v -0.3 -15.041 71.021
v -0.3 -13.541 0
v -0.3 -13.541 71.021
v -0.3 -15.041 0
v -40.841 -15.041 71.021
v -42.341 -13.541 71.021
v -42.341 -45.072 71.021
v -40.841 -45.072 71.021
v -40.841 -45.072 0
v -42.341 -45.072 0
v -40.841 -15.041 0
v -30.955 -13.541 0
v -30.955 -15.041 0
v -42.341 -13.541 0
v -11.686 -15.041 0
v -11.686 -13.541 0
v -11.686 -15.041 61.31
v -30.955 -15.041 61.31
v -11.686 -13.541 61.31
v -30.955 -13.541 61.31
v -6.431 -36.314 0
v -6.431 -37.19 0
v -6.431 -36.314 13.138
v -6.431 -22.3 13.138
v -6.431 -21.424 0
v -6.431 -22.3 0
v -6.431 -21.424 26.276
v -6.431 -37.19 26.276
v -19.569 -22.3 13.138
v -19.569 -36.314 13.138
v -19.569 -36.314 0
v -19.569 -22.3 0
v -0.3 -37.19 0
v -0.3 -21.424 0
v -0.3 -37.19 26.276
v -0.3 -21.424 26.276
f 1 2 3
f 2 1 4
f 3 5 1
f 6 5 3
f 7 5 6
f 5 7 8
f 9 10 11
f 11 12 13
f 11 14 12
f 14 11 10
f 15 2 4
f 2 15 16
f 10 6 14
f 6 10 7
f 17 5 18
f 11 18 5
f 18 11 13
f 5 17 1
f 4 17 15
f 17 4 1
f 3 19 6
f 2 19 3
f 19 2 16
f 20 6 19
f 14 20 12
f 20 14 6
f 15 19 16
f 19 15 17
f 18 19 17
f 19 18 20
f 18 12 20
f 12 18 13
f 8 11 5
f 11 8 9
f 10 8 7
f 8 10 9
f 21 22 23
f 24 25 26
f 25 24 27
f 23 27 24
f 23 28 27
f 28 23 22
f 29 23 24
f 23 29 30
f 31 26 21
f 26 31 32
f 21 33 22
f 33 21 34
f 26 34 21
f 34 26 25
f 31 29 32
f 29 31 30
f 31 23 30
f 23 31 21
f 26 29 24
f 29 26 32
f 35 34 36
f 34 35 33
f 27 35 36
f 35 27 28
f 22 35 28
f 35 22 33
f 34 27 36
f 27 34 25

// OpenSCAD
// =====================================================================
//  VIEW 15: RESTROOM  -  print 1
//  Milwaukee Road 1939 rib side bay window caboose - G scale (1:29)
//  Restroom partitions and toilet
//  Print orientation: upright
//
//  Open this file in OpenSCAD to look at just this part.
//  To export this part's STL: Render (F6), then File > Export > STL.
//  The part's code lives in library/restroom.scad; settings in
//  library/caboose_params.scad.
// =====================================================================

part     = "restroom";    // which part - leave as is
view     = "print";  // "print"     = laid out as it goes on the printer bed
                     //               (same as the exported STL)
                     // "installed" = in its place on the car (all copies)
show_car = false;    // with "installed": faint see-through body, roof and
                     //   underframe around it for context

include <../library/caboose_all.scad>

if (view == "installed") {
    caboose_installed(part);
    if (show_car) car_ghost();
} else {
    caboose_print(part);
}
echo(str("restroom: print 1"));
